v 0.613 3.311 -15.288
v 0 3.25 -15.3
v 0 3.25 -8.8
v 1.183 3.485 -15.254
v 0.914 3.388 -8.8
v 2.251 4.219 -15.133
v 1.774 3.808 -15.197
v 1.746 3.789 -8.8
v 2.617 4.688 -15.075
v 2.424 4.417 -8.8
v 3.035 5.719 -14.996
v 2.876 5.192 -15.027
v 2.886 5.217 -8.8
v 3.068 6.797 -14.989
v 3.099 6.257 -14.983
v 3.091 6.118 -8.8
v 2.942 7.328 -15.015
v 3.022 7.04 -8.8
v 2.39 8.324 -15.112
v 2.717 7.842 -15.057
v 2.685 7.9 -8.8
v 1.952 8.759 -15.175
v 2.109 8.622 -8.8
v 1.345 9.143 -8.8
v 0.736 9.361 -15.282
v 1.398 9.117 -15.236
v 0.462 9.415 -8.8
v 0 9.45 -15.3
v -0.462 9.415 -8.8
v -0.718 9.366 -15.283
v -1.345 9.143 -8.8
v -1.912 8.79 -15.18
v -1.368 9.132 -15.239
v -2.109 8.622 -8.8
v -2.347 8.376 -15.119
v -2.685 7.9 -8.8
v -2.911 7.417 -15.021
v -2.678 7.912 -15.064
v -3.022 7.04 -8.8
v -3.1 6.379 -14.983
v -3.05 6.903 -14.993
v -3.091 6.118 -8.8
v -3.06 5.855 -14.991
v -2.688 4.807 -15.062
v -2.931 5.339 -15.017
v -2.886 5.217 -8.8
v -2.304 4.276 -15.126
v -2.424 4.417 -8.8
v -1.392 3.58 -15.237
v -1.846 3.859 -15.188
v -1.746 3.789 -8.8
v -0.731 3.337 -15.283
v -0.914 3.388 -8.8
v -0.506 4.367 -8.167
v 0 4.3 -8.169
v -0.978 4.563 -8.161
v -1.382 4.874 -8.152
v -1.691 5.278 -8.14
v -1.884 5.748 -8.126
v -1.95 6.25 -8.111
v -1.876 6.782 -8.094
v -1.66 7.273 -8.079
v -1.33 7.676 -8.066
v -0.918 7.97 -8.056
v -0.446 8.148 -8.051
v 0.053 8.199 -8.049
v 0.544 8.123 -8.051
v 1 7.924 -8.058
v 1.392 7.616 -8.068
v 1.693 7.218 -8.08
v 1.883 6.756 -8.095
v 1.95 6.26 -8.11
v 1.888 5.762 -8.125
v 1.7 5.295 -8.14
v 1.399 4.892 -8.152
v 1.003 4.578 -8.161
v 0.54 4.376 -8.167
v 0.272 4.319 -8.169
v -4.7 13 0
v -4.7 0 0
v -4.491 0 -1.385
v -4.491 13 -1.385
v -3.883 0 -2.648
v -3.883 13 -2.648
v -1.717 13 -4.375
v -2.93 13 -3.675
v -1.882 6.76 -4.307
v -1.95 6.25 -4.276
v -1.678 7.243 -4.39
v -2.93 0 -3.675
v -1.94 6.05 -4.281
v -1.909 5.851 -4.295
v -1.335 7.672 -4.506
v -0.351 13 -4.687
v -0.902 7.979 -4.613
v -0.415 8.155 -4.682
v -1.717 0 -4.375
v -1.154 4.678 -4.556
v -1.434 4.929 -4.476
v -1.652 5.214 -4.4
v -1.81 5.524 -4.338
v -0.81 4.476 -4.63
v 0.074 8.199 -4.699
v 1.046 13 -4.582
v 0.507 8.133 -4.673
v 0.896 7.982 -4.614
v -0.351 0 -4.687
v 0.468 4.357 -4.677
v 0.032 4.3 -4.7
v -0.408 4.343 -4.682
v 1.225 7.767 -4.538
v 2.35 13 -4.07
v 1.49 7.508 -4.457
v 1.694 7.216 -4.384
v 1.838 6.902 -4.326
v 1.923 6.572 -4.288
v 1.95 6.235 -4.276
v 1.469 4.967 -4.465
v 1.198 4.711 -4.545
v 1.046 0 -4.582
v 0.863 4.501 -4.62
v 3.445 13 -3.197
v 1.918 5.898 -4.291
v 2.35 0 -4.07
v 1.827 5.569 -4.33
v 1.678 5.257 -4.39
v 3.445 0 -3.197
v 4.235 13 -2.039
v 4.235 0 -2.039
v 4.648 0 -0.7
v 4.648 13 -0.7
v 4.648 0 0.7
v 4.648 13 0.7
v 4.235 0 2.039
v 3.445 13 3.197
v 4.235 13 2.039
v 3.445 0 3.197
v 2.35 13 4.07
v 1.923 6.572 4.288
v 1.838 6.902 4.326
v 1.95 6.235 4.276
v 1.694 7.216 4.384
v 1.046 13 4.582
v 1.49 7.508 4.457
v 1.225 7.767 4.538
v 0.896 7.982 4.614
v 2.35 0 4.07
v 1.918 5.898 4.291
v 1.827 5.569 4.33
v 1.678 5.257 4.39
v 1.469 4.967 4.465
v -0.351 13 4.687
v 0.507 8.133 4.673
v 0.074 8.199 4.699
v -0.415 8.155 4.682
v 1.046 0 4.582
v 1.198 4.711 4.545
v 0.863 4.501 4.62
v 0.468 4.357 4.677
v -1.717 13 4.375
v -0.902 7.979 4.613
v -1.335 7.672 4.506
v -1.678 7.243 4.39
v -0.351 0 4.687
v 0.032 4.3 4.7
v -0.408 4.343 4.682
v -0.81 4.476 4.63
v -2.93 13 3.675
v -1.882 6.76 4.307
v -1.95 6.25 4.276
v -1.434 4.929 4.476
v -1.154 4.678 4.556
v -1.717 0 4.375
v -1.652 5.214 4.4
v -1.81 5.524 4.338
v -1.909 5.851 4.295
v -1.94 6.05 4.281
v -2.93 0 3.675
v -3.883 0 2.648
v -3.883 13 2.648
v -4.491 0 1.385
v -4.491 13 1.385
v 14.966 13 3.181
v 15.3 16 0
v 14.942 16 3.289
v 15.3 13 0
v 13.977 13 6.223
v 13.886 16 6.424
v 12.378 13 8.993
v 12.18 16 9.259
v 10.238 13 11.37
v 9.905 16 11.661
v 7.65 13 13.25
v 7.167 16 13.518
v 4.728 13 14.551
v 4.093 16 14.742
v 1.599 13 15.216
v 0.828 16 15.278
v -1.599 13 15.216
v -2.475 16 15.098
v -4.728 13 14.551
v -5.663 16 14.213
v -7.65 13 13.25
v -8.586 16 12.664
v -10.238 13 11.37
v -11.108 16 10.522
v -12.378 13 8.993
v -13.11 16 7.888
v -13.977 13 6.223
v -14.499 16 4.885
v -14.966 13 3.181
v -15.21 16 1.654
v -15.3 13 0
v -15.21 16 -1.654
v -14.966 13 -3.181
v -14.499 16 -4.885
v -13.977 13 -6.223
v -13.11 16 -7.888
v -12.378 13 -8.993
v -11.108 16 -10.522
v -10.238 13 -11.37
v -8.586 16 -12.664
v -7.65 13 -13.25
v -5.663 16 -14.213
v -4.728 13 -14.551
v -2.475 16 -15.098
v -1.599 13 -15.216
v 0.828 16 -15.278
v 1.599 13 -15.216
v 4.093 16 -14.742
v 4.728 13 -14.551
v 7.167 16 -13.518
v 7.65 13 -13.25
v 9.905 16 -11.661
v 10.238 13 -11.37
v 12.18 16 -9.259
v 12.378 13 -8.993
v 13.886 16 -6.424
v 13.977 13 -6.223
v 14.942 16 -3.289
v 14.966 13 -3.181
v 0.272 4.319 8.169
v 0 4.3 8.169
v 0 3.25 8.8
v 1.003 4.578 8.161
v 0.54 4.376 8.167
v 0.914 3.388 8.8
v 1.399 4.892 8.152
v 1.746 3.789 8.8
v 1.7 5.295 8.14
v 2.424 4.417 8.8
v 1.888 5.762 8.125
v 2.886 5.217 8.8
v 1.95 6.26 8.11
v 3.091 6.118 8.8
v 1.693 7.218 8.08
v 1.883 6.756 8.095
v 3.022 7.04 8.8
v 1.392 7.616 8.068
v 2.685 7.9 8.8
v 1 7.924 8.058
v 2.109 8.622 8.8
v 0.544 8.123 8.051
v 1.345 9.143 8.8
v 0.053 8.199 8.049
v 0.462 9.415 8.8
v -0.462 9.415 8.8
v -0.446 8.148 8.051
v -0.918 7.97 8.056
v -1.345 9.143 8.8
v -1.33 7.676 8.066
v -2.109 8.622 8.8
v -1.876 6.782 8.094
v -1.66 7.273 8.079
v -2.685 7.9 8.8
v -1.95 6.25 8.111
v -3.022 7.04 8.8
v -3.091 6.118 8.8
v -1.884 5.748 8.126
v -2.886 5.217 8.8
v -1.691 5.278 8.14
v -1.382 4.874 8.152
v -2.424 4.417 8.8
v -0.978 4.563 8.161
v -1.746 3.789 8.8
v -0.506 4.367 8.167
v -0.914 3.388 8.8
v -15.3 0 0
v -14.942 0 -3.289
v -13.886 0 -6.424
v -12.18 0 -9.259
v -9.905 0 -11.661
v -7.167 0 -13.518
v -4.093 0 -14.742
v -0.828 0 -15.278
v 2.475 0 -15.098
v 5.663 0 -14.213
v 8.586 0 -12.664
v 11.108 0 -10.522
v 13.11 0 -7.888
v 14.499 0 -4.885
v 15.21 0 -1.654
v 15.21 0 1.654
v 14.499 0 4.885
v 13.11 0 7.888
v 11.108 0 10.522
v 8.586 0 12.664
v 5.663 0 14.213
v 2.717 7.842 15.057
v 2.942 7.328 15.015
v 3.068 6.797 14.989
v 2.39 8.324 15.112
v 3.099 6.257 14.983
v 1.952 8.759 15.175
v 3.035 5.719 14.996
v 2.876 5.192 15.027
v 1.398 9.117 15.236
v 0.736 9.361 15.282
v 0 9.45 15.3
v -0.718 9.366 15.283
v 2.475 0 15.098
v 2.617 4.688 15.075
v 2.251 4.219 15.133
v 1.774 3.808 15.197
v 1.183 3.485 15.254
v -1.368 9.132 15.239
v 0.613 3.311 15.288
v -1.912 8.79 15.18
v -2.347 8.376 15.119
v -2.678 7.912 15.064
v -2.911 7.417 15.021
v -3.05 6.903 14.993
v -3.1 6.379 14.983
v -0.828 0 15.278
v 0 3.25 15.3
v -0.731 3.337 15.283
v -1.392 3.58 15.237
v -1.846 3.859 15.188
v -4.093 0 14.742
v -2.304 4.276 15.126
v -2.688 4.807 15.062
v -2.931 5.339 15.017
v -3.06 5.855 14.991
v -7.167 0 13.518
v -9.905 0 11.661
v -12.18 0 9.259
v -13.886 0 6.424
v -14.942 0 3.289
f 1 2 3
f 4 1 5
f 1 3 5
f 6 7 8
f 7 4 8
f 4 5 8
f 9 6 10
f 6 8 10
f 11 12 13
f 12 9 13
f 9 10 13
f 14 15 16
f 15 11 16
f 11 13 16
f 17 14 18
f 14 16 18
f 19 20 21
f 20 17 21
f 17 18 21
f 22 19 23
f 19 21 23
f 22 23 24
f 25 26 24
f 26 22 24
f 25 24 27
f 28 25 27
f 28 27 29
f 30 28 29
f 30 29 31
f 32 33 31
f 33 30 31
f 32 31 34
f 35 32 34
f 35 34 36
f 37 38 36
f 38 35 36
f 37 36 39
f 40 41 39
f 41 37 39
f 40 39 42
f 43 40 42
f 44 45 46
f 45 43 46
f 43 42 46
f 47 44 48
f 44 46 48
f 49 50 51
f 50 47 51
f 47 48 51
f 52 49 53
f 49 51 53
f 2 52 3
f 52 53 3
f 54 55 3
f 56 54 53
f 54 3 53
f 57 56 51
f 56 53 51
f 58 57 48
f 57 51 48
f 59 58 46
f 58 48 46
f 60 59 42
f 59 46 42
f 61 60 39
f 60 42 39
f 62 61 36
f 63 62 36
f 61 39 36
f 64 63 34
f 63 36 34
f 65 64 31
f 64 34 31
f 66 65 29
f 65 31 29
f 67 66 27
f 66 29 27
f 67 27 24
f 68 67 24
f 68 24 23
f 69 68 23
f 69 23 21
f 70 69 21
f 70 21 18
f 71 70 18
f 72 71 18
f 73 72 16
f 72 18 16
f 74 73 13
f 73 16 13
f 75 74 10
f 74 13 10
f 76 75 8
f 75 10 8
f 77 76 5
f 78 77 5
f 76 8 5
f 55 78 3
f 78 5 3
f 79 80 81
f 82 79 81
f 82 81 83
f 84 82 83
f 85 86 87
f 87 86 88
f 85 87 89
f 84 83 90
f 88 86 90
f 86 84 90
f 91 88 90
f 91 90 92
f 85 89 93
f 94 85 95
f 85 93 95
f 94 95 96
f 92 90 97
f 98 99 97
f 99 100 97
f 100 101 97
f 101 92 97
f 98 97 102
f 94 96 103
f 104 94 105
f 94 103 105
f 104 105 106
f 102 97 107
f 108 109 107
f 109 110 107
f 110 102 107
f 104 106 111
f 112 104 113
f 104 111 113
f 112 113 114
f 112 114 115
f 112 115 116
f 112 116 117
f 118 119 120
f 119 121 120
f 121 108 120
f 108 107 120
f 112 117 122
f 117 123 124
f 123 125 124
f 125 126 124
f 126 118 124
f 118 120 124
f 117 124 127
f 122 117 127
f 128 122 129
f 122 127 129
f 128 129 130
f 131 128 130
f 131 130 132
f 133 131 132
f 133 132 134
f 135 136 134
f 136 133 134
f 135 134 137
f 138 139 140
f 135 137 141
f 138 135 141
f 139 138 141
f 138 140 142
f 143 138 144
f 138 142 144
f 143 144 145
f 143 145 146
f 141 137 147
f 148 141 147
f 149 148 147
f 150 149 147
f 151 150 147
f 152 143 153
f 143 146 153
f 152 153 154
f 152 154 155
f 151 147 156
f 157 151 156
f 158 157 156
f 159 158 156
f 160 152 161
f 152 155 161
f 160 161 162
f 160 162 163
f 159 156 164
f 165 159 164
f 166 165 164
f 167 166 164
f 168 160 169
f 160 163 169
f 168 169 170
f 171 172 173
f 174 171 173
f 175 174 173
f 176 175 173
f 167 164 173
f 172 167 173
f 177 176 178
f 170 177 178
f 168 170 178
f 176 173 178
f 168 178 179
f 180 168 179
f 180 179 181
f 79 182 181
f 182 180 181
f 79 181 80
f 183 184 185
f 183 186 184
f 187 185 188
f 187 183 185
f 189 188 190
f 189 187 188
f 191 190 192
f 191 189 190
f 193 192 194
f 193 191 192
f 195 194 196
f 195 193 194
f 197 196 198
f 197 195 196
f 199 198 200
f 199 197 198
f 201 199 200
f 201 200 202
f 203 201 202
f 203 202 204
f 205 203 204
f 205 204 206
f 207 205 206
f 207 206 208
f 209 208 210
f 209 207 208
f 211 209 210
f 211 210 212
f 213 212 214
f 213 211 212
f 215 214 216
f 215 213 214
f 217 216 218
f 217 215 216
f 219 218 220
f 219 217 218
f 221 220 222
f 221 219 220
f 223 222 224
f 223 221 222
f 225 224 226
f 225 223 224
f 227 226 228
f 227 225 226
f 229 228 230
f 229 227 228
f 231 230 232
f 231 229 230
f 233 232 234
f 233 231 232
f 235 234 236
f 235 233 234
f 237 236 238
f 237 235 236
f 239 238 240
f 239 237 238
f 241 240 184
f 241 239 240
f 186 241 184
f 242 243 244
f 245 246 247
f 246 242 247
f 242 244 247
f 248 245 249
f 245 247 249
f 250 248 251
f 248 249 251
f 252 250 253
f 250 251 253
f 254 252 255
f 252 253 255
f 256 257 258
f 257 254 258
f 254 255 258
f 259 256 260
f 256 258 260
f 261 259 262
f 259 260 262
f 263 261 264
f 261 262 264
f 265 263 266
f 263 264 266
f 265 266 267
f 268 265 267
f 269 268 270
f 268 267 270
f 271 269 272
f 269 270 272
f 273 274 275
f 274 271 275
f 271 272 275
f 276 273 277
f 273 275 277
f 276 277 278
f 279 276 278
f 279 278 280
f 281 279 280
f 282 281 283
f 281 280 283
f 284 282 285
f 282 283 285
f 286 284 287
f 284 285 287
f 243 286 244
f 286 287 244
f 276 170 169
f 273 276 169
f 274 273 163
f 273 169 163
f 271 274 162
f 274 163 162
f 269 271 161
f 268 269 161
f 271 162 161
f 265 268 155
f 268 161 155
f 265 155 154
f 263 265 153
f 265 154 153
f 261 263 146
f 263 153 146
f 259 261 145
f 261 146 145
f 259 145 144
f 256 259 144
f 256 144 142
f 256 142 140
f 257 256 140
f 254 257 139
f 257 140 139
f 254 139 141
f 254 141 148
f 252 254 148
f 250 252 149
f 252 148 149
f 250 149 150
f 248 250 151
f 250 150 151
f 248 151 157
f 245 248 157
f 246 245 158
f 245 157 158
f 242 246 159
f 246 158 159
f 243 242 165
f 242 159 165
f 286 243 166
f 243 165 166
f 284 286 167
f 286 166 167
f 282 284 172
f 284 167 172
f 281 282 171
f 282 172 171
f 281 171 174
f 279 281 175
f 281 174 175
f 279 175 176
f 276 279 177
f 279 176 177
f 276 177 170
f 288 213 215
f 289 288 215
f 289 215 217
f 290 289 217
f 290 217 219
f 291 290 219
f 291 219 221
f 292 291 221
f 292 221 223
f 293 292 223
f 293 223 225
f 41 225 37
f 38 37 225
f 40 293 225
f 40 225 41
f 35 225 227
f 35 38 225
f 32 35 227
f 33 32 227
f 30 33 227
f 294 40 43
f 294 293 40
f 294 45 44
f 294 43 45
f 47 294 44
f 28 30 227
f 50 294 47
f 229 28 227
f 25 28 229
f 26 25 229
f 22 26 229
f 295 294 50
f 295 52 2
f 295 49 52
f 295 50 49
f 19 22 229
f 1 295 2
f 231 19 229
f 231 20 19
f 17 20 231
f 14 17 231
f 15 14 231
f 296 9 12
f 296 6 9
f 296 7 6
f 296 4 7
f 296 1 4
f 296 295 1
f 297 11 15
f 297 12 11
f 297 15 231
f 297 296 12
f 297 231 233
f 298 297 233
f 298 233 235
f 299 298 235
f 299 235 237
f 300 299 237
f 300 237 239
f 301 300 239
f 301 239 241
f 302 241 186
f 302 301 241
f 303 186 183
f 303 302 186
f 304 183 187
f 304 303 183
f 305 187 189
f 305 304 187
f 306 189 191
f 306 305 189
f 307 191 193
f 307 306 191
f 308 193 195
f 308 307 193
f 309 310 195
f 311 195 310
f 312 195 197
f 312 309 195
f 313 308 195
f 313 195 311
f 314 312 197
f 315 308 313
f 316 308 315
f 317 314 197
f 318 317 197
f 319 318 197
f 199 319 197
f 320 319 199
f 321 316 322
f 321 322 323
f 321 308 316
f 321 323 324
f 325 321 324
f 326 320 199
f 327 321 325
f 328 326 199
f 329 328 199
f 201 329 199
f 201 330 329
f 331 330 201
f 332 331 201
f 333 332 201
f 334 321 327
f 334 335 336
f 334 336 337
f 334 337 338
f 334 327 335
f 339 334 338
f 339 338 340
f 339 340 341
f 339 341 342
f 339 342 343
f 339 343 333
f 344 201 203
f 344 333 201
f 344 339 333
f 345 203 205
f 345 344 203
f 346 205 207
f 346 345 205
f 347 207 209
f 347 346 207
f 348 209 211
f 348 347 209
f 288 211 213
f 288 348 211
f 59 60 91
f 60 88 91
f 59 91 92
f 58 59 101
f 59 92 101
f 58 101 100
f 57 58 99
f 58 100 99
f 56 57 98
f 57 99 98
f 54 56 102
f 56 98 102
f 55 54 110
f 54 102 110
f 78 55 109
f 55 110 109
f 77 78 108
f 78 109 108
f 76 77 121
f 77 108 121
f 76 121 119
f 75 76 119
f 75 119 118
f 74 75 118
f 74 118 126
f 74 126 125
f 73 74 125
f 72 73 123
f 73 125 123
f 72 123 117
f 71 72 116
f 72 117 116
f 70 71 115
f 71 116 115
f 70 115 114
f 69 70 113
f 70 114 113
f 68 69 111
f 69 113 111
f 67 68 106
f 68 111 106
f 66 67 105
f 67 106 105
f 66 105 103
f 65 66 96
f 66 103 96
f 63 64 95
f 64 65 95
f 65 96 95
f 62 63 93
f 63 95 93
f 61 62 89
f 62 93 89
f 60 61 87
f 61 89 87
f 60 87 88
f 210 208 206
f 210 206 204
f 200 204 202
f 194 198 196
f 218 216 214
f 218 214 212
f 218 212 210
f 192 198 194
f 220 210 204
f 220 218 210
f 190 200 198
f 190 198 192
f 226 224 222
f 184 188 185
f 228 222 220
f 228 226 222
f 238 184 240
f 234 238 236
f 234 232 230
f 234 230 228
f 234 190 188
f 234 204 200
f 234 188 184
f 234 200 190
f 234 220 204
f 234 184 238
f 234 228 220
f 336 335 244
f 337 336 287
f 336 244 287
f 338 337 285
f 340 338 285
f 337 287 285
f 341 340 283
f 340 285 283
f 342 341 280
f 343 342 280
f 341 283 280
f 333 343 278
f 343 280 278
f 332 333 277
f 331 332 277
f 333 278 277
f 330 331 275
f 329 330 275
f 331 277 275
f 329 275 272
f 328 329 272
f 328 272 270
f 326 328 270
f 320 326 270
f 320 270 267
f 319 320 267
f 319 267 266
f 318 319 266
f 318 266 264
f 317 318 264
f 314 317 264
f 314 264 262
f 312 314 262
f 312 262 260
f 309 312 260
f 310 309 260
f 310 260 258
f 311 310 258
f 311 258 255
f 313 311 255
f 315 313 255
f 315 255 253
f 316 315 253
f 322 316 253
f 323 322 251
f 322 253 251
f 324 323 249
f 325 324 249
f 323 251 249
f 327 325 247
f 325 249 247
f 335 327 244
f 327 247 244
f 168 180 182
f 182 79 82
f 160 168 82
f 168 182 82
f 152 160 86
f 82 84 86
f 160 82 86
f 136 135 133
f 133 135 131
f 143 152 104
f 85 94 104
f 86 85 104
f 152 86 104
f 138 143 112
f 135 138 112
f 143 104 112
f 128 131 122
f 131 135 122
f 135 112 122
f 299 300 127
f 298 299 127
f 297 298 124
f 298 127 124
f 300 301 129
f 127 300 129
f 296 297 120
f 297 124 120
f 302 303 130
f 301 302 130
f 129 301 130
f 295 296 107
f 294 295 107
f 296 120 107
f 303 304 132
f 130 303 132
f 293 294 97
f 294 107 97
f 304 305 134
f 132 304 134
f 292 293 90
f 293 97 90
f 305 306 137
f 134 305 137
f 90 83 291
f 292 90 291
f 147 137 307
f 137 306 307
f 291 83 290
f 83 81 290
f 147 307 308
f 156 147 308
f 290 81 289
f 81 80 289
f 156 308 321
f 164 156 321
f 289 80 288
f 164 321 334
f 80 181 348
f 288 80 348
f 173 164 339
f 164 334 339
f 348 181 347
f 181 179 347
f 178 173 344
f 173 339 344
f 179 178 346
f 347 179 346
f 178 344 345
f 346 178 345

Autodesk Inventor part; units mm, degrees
ref_plane "YZ Plane" through (0, 0, 0) normal (1, 0, 0) x (0, 1, 0)
ref_plane "XZ Plane" through (0, 0, 0) normal (0, 1, 0) x (-1, 0, 0)
ref_plane "XY Plane" through (0, 0, 0) normal (0, 0, 1) x (1, 0, 0)
sketch "Sketch1" plane through (0, 0, 0) normal (0, 1, 0) x (-1, 0, 0)
  circle A0 centre (0, 0) radius 15.3
  circle A1 centre (0, 0) radius 4.7
  dimension "d0" = 30.6
  dimension "d1" = 9.4
extrude "Extrusion1" add sketch "Sketch1" along normal blind 13
sketch "Sketch2" plane through (0, 13, 0) normal (0, 1, 0) x (1, 0, 0)
  line L0 (19.8933, 0) -> (-23.0575, 0) construction
  point P0 (0, 0)
ref_plane "Work Plane1" through (19.8933, 13, 0) normal (0, 0, -1) x (-1, 0, 0)
sketch "Sketch3" plane through (19.8933, 13, 0) normal (0, 0, -1) x (-1, 0, 0)
  circle A0 centre (19.8933, -6.75) radius 1.95
  line L0 (35.1933, 0) -> (4.5933, 0) projected
  line L1 (15.1933, 0) -> (24.5933, 0) projected
  point P0 (19.8933, -13)
  dimension "d5" = 3.9
  dimension "d18" = 6.75
extrude "Extrusion2" cut sketch "Sketch3" along normal through all both and the other way through all
ref_plane "Work Plane2" through (0, 0, 15.3) normal (0, 0, -1) x (-1, 0, 0)
sketch "Sketch4" plane through (0, 0, 15.3) normal (0, 0, -1) x (-1, 0, 0)
  point P0 (0, 0)
  point P1 (1.95, 6.25)
  point P2 (0, 6.35)
hole "Hole1" at (0, 6.35, 15.3) direction (0, 0, -1) diameter 6.2 depth 6.5 tip angle 118
mirror "Mirror1" about plane through (19.8933, 13, 0) normal (0, 0, -1) of "Hole1"
sketch "Sketch5" plane through (0, 13, 0) normal (0, 1, 0) x (1, 0, 0)
  circle A0 centre (0, 0) radius 15.3 projected
extrude "Extrusion3" add sketch "Sketch5" along normal blind 3
properties part number "brImp_fan"
